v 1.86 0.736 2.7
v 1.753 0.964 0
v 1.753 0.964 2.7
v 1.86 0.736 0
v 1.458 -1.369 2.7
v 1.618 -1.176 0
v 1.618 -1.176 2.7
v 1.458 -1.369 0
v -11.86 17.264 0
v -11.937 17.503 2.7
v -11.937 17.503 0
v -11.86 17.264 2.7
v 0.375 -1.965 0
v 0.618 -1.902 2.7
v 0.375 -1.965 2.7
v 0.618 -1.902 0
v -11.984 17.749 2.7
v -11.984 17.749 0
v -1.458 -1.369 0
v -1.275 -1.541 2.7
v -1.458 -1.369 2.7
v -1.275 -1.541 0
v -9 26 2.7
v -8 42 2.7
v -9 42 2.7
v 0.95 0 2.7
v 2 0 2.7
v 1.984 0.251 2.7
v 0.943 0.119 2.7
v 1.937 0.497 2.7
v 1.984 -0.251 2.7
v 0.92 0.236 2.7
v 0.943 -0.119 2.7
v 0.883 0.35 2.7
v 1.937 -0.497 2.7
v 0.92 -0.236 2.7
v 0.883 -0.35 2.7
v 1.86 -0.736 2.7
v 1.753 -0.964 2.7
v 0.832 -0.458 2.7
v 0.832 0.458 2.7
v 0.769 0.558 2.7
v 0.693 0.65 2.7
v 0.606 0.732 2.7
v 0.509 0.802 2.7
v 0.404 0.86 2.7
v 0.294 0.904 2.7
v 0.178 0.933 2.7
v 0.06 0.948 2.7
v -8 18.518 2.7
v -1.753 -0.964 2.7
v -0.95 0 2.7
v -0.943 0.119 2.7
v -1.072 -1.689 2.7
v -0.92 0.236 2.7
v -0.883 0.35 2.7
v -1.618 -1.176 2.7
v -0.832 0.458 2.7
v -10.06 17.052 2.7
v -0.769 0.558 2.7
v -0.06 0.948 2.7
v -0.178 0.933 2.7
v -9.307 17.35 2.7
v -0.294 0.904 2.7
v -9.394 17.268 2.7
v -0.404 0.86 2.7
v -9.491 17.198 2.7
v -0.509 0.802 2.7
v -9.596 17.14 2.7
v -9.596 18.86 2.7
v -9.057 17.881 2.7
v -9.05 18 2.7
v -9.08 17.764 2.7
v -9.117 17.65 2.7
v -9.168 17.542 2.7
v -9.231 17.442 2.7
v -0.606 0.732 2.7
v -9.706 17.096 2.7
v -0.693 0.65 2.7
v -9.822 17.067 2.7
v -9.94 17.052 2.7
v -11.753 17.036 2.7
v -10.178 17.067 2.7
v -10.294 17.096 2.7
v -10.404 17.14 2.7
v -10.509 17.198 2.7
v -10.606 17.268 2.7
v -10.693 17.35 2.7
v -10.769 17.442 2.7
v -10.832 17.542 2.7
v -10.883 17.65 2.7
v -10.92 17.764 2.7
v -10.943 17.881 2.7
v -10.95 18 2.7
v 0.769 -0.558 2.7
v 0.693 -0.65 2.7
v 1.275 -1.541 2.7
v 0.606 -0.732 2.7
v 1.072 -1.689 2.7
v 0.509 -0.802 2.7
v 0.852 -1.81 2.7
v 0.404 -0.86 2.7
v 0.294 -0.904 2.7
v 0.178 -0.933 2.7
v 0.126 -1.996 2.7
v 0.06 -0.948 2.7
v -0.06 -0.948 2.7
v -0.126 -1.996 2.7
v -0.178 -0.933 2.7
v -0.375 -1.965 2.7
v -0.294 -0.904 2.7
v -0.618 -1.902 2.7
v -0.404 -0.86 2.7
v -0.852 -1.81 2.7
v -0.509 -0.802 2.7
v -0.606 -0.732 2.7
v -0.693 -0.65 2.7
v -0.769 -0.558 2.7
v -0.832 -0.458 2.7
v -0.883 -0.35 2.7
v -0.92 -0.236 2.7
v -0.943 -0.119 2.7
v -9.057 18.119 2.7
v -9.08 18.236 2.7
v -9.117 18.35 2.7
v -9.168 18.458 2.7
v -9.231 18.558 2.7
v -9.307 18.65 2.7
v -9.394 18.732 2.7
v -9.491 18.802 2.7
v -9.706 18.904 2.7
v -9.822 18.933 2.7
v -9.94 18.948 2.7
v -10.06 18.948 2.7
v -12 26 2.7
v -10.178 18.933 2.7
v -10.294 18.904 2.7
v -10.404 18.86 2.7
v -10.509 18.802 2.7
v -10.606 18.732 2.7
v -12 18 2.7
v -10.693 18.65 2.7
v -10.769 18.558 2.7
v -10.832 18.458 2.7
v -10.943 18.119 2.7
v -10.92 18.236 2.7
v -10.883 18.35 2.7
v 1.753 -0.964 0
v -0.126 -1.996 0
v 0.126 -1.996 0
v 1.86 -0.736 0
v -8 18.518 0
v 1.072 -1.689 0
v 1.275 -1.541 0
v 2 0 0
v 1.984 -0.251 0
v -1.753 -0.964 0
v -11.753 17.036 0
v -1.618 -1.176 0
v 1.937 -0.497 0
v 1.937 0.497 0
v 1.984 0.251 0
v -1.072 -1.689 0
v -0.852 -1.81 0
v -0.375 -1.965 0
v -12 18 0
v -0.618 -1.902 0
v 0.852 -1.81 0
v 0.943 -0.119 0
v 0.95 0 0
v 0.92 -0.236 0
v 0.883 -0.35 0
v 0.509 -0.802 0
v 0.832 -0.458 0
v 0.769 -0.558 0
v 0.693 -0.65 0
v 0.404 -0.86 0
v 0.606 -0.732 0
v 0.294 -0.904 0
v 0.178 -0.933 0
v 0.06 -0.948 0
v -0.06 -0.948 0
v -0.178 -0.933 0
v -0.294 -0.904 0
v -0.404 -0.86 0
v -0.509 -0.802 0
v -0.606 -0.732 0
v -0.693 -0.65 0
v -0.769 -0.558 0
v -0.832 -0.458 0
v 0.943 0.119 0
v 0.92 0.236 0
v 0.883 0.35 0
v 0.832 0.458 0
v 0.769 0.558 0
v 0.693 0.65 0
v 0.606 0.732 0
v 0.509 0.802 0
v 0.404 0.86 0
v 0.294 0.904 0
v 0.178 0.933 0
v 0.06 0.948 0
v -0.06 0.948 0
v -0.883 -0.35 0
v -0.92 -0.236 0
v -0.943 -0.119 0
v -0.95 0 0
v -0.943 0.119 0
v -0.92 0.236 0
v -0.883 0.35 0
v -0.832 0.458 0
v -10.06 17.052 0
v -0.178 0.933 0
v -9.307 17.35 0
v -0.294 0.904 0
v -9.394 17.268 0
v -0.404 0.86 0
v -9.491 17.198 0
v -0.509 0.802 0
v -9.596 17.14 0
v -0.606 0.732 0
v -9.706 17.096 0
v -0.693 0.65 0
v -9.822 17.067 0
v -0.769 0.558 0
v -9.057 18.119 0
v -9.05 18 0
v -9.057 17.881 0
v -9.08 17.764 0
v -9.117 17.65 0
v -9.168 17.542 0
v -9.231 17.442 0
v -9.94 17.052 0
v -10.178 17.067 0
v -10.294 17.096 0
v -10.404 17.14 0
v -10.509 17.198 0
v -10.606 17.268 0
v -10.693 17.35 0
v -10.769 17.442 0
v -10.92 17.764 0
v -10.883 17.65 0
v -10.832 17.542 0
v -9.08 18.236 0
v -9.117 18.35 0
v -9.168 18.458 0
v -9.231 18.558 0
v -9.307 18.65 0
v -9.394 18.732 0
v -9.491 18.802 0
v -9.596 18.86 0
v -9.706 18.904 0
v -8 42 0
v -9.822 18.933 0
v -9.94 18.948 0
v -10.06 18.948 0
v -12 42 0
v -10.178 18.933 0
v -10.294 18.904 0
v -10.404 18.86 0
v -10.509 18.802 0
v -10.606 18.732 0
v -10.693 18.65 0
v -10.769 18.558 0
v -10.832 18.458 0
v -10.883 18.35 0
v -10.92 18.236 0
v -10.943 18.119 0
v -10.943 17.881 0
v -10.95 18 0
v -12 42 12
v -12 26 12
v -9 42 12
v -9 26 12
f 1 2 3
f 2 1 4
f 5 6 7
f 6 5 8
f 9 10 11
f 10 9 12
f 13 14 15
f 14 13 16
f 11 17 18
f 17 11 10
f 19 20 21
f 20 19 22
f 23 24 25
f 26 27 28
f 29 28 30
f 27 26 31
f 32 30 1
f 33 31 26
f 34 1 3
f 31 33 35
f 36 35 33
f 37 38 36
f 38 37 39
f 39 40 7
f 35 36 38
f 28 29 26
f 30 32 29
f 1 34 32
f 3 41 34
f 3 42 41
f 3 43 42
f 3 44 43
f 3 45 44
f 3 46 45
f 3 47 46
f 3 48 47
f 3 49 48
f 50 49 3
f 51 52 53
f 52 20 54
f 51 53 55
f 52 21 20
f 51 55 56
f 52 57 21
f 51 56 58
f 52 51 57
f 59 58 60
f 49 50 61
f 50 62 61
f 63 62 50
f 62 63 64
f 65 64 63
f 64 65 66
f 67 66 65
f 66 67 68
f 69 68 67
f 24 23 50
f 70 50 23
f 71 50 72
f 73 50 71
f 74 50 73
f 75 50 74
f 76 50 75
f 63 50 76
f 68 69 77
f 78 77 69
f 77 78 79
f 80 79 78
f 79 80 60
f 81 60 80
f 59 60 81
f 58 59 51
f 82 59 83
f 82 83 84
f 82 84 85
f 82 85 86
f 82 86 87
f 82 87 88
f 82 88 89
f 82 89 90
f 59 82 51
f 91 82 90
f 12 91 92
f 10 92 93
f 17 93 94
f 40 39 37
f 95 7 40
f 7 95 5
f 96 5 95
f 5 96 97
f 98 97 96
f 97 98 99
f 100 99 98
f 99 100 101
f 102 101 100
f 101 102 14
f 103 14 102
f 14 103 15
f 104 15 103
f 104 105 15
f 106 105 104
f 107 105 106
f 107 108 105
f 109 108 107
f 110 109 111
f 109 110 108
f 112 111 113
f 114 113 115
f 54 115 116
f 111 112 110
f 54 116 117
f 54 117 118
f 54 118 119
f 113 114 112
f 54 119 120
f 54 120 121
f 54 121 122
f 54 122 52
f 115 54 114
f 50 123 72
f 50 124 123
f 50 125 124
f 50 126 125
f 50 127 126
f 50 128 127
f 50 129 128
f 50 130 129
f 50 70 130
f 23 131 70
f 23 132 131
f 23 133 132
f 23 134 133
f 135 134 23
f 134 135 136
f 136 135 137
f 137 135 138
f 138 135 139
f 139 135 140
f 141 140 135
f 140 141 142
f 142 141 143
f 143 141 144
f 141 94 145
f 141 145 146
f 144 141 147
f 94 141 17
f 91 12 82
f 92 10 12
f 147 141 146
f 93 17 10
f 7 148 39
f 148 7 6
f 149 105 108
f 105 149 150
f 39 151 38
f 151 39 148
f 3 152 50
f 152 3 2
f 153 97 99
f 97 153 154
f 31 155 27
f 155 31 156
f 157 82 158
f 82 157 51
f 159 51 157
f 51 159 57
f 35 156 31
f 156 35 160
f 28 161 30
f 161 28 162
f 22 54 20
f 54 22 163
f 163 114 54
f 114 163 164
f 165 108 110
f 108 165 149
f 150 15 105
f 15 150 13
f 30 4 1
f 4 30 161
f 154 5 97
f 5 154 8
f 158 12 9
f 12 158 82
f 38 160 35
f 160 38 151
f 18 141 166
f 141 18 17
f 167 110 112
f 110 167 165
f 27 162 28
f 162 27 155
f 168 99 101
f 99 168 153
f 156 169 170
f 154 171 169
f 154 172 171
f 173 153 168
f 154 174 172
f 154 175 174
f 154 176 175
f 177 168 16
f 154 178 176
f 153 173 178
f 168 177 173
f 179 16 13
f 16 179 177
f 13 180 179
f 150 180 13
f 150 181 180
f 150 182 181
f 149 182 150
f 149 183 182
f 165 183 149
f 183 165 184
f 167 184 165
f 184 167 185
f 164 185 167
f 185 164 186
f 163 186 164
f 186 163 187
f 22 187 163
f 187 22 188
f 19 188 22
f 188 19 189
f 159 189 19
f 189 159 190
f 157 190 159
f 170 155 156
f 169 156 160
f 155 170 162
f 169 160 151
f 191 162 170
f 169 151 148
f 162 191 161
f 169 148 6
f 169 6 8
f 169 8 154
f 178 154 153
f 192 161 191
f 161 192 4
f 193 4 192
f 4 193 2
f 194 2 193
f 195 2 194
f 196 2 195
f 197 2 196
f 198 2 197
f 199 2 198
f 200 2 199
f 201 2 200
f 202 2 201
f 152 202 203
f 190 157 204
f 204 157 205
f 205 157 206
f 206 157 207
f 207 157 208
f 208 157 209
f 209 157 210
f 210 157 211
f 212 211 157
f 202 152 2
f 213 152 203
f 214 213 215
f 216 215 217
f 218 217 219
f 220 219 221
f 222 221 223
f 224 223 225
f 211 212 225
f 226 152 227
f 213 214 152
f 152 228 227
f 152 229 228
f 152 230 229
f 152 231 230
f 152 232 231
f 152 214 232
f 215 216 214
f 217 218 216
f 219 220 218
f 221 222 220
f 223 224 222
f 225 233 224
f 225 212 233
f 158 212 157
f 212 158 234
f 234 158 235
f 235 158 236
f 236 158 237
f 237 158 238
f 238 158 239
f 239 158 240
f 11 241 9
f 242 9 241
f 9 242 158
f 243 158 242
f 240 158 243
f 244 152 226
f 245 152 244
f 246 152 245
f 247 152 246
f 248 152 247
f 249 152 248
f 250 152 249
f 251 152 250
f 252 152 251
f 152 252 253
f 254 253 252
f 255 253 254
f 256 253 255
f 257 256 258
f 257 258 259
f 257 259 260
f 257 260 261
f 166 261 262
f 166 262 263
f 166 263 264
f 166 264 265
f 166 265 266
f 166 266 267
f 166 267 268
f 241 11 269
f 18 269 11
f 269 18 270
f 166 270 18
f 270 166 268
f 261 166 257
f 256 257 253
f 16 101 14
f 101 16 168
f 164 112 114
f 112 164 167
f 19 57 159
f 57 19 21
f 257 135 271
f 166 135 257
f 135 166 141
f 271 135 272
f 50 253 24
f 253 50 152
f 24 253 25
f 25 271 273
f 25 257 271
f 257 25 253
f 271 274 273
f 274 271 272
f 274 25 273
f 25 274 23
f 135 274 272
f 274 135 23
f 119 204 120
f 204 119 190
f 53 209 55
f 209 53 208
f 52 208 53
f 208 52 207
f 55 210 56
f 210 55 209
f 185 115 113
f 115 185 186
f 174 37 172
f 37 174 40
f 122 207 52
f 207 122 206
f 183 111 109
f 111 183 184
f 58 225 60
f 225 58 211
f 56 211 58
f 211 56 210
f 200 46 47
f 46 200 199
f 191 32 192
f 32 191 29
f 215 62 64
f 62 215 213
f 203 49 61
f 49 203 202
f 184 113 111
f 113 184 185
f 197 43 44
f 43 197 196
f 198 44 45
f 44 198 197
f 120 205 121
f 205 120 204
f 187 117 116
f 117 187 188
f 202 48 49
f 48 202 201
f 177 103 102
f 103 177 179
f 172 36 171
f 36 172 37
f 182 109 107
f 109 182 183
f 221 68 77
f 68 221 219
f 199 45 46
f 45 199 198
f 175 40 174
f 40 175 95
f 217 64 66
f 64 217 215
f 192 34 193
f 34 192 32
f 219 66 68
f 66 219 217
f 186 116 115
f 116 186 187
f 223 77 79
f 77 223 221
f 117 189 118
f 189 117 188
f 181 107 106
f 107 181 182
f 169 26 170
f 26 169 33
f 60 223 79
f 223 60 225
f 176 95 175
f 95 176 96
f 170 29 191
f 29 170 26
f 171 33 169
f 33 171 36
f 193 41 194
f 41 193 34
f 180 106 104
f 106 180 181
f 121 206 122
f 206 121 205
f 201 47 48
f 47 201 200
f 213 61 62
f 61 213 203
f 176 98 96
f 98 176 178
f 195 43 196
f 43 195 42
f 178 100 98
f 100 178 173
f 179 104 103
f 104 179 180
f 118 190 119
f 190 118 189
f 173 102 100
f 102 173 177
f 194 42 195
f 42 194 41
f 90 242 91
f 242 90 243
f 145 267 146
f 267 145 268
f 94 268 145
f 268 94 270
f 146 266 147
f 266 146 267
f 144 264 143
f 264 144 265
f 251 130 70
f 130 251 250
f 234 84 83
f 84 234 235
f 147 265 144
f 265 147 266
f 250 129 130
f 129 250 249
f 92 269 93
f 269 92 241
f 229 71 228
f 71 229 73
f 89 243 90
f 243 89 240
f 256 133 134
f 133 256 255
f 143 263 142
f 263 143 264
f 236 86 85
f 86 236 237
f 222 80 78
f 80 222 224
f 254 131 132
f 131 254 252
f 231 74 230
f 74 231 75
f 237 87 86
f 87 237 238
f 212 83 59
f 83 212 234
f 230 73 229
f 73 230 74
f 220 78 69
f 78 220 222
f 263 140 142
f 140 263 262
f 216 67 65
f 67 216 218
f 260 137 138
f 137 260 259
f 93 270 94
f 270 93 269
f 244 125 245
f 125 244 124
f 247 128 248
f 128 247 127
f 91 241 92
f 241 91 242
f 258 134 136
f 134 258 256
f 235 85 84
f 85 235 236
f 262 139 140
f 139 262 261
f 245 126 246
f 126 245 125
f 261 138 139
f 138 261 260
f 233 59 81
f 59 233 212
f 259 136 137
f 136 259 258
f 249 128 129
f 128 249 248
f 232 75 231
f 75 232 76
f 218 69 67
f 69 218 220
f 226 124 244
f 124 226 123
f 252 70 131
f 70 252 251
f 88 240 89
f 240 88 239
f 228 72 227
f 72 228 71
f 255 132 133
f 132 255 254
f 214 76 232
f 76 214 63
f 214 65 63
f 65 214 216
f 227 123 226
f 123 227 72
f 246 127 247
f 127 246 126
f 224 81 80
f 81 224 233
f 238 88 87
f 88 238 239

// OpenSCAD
$fn = 50;
locked3mm = 2.9;           //hole diameter for a locked/tight/screwed down 2mm screw
free_turning2mm = 2.5;      //hole diameter for a free turning 2mm screw
locked2mm  = 1.9;            //hole diameter for a locked/tight/screwed down 2mm
thickness = 2.7;           //thickness of the gears and beams etc.
gear_radius = 15;           //radius of the gears (cogs)
left_gear_hole_diameter = free_turning2mm; //diameter of hole in left gear
right_gear_hole_diameter = 2.1;   //attacing to servo sotiny bit > 2mm (shrinkage)
no_teeth  = 7;              //number of teeth on the gears
teeth_width = 4;            //width of gear teeth
teeth_bevel = 3;            //diameter of circles at end of teeth
teeth_height = 3.5;         //height of gear teeth
teeth_budge = 0.4;         //distances gears need to be appart to fit together
beam_widths = 4;           //width of all beams
beam1_width = beam_widths;    //width of the first beam
beam1_length = 33;          //length of the first beam
beam1_hole_diameter = free_turning2mm; //diameter of screw hole at end of beam
beam2_width = beam_widths;   //width of the second beam
beam2_length = beam1_length; //length of the second beam
beam2_hole_diameter = free_turning2mm;//diameter of screw holes at end of beam
beam2_center_dist = 10;       //translating beam2 from beam1 towards the centerline
beam2_forward_dist = 18;     //translatimg beam2 from beam1 in y dir towards the grabber end
servo_width = 12;           //width of servo
servo_length = 23;          //length of servo
servo_height = 10.8;        //height of servo bracket (not whole servo)
servo_wall_thick = 1.2;      //thickness of bracket
servo_shaft = 5.9;          //distance of shaft from closest lengthwise edge
gripper_arm_length = 24;     //length of nipper
gripper_arm_thickness = 5;   //thickness of end nippers
gripper_arm_pad_length = 16;  //length of the raised pad
gripper_arm_pad_thickness = 3;//thickness of the raised pad
gripper_arm_pad_height = 12;  //height of the raised pad
gripper_arm_width = beam_widths; //width of end nippers

gear_hole_dist = gear_radius * 2 - teeth_height + teeth_budge;

//////

arm_block_width = 15;        //width of block for connecting arms
arm_block_length = 5;         //length ""
arm_block_height = 9.9 + 5.5;         //height for screws to attach to connecting arms

support_arm_length = 5;      //length of block
support_arm_width = 15;       //widhth of block
support_arm_height = arm_block_height + 20;     //heighrt for screw to attach to the support arm
support_arm_distance = 32;   //distance from little block
support_arm_stength_width  = 4;  //width of support for support arm block
support_arm_stength_length = 2.5; //length ""


plate_width = 40.5;           //width of bottom plate
plate_length = 40 + locked3mm + arm_block_length/2;          //length of bottom palte
plate_bevel_back = 5;        //bevel radius for back corners of plate
plate_bevel_front = 10;      //bevel radius for front corners of plate


module gear(){
   cylinder(r=gear_radius - teeth_height, h = thickness);
   for (i = [0:180/(no_teeth-1):180]){
      rotate(i)
      hull(){
         translate([0,-0.5*teeth_width,0])
         cube([gear_radius - teeth_height, teeth_width, thickness]);
         translate([gear_radius - teeth_bevel /2, 0, 0])
         cylinder(d = teeth_bevel, h=thickness, $fn = 25);
      }
   }
}


module left_gear(){
   difference(){
      union(){
         rotate(-(180/(no_teeth-1)) / 2 - 90)
         gear();
         beam1();
      }
      cylinder(d=left_gear_hole_diameter, h=thickness);
   }
}

module right_gear(){
   difference(){
      union(){
         rotate(90)
         gear();
         beam1();
      }
      cylinder(d=right_gear_hole_diameter, h=thickness);
   }  
}

module beam1(){
   difference(){
      union(){
         translate([-0.5 * beam1_width, 0, 0])
         cube([beam1_width, beam1_length - 0.5 * beam1_width, thickness]);
         translate([0, beam1_length - 0.5 * beam1_width, 0])
         cylinder(d=beam1_width, h=thickness);
      }
      translate([0, beam1_length - 0.5 * beam1_width, 0])
      cylinder(d=beam1_hole_diameter, h=thickness);
   }
}

module beam2(){
   difference(){
      union(){
         translate([-0.5 * beam2_width, 0, 0])
         cube([beam2_width, beam2_length - 0.5 * beam2_width, thickness]);
         cylinder(d=beam2_width, h=thickness);
         translate([0,beam2_length - 0.5 * beam2_width, 0])
         cylinder(d=beam2_width, h=thickness);   
      }
      cylinder(d=beam2_hole_diameter, h=thickness);
      translate([0, beam2_length - 0.5 *beam2_width, 0])
      cylinder(d=beam2_hole_diameter, h=thickness);      
   }
}

module bottom_plate(){
   difference (){
      //bottom base plate to cut crap out of
      hull(){
         translate([gear_hole_dist/2 - plate_width/2 + plate_bevel_front, plate_length/2 - plate_bevel_front, 0])
         cylinder(r=plate_bevel_front, h = thickness);
         translate([gear_hole_dist/2 + plate_width/2 - plate_bevel_front, plate_length/2 - plate_bevel_front, 0])
         cylinder(r=plate_bevel_front, h = thickness);
         translate([gear_hole_dist/2 - plate_width/2 + plate_bevel_back , -plate_length/2 + plate_bevel_back, 0])
         cylinder(r=plate_bevel_back, h = thickness);
         translate([gear_hole_dist/2 + plate_width/2 - plate_bevel_back , -plate_length/2 + plate_bevel_back, 0])
         cylinder(r=plate_bevel_back, h = thickness);
      }
      
      /*
      translate([-0.5 * plate_length + 0.5 * gear_hole_dist, -0.5 * plate_width, 0])
      cube([plate_length, plate_width, thickness]);
      */
      
      //holes for screws of gears and servo mount cutouts
      cylinder(d=locked2mm,h=thickness);
      translate([gear_hole_dist -2, 0, 0])
      cube([15, servo_width, 30], center=true);  
      
      //cutouts for beam 2 bottom hole mounts
      translate([beam2_center_dist, beam2_forward_dist, 0])
      cylinder(d=locked2mm, h=thickness);
      translate([gear_hole_dist - beam2_center_dist, beam2_forward_dist, 0])
      cylinder(d=locked2mm, h=thickness);
      
   }
   translate([gear_hole_dist, 0, -servo_height + thickness])
   servo_bracket();
   
   //arm block
   translate([gear_hole_dist / 2 - arm_block_width/2, -plate_length/2, -arm_block_height])
   difference(){
      cube([arm_block_width, arm_block_length, arm_block_height + arm_block_length/2]);
      translate([0, arm_block_length/2, arm_block_length/2 ])
      rotate([0, 90, 0])
      cylinder(d = locked3mm, h=arm_block_width);
   }
   
   //suport arm block
   translate([gear_hole_dist / 2 - support_arm_width/2, -plate_length/2 + arm_block_length/2 + support_arm_distance - support_arm_length/2, -support_arm_height])
   difference(){
      union(){
         cube([support_arm_width, support_arm_length, support_arm_height + support_arm_length/2]);
         translate([support_arm_width/2-support_arm_stength_width/2,-support_arm_stength_length,support_arm_length/2+ support_arm_height - servo_height])
         cube([support_arm_stength_width, support_arm_stength_length, servo_height]);
      }
      translate([0,support_arm_length/2, support_arm_length/2])
      rotate([0, 90, 0])
      cylinder(d=locked3mm, h = support_arm_width);
   }
         
}

module servo_bracket(){
 translate([-(servo_length+2*servo_wall_thick)/2 - servo_shaft,-(servo_width+2*servo_wall_thick)/2,0])
 difference(){
   cube([servo_length + 2*servo_wall_thick, servo_width + 2*servo_wall_thick, servo_height]);
   translate([servo_wall_thick, servo_wall_thick, 0])
   cube([servo_length, servo_width, servo_height]);
 }   
}

module gripper_arm(){
   difference(){
      union(){
         hull(){
            cylinder(d = gripper_arm_width, h = thickness);   
            translate([beam2_center_dist, beam2_forward_dist, 0])
            cylinder(d = gripper_arm_width, h = thickness);
         }
         translate([-0.5 * gripper_arm_width + beam2_center_dist, beam2_forward_dist, 0])
         cube([gripper_arm_width, gripper_arm_length, thickness]);

         translate([-0.5 * gripper_arm_width + beam2_center_dist + (gripper_arm_width - gripper_arm_pad_thickness), beam2_forward_dist + (gripper_arm_length - gripper_arm_pad_length), 0])
         cube([gripper_arm_pad_thickness, gripper_arm_pad_length, gripper_arm_pad_height]);
         
      }
      cylinder(d = locked2mm, h = thickness);   
      translate([beam2_center_dist, beam2_forward_dist, 0])
      cylinder(d = locked2mm, h = thickness);
      
   }
}

module left_arm(){
   gripper_arm();
}

module right_arm(){
   mirror([1,0,0])
   gripper_arm();
}


translate([0,beam1_length - 0.5 * beam_widths,-thickness])
left_arm();

translate([gear_hole_dist,beam1_length - 0.5 * beam_widths,-thickness])
!right_arm();

translate([beam2_center_dist,beam2_forward_dist,0])
beam2();

translate([gear_hole_dist - beam2_center_dist,beam2_forward_dist,0])
beam2();


translate([0,0,-thickness])
bottom_plate();

left_gear();

translate([gear_radius * 2 - teeth_height + teeth_budge,0,0])
right_gear();
